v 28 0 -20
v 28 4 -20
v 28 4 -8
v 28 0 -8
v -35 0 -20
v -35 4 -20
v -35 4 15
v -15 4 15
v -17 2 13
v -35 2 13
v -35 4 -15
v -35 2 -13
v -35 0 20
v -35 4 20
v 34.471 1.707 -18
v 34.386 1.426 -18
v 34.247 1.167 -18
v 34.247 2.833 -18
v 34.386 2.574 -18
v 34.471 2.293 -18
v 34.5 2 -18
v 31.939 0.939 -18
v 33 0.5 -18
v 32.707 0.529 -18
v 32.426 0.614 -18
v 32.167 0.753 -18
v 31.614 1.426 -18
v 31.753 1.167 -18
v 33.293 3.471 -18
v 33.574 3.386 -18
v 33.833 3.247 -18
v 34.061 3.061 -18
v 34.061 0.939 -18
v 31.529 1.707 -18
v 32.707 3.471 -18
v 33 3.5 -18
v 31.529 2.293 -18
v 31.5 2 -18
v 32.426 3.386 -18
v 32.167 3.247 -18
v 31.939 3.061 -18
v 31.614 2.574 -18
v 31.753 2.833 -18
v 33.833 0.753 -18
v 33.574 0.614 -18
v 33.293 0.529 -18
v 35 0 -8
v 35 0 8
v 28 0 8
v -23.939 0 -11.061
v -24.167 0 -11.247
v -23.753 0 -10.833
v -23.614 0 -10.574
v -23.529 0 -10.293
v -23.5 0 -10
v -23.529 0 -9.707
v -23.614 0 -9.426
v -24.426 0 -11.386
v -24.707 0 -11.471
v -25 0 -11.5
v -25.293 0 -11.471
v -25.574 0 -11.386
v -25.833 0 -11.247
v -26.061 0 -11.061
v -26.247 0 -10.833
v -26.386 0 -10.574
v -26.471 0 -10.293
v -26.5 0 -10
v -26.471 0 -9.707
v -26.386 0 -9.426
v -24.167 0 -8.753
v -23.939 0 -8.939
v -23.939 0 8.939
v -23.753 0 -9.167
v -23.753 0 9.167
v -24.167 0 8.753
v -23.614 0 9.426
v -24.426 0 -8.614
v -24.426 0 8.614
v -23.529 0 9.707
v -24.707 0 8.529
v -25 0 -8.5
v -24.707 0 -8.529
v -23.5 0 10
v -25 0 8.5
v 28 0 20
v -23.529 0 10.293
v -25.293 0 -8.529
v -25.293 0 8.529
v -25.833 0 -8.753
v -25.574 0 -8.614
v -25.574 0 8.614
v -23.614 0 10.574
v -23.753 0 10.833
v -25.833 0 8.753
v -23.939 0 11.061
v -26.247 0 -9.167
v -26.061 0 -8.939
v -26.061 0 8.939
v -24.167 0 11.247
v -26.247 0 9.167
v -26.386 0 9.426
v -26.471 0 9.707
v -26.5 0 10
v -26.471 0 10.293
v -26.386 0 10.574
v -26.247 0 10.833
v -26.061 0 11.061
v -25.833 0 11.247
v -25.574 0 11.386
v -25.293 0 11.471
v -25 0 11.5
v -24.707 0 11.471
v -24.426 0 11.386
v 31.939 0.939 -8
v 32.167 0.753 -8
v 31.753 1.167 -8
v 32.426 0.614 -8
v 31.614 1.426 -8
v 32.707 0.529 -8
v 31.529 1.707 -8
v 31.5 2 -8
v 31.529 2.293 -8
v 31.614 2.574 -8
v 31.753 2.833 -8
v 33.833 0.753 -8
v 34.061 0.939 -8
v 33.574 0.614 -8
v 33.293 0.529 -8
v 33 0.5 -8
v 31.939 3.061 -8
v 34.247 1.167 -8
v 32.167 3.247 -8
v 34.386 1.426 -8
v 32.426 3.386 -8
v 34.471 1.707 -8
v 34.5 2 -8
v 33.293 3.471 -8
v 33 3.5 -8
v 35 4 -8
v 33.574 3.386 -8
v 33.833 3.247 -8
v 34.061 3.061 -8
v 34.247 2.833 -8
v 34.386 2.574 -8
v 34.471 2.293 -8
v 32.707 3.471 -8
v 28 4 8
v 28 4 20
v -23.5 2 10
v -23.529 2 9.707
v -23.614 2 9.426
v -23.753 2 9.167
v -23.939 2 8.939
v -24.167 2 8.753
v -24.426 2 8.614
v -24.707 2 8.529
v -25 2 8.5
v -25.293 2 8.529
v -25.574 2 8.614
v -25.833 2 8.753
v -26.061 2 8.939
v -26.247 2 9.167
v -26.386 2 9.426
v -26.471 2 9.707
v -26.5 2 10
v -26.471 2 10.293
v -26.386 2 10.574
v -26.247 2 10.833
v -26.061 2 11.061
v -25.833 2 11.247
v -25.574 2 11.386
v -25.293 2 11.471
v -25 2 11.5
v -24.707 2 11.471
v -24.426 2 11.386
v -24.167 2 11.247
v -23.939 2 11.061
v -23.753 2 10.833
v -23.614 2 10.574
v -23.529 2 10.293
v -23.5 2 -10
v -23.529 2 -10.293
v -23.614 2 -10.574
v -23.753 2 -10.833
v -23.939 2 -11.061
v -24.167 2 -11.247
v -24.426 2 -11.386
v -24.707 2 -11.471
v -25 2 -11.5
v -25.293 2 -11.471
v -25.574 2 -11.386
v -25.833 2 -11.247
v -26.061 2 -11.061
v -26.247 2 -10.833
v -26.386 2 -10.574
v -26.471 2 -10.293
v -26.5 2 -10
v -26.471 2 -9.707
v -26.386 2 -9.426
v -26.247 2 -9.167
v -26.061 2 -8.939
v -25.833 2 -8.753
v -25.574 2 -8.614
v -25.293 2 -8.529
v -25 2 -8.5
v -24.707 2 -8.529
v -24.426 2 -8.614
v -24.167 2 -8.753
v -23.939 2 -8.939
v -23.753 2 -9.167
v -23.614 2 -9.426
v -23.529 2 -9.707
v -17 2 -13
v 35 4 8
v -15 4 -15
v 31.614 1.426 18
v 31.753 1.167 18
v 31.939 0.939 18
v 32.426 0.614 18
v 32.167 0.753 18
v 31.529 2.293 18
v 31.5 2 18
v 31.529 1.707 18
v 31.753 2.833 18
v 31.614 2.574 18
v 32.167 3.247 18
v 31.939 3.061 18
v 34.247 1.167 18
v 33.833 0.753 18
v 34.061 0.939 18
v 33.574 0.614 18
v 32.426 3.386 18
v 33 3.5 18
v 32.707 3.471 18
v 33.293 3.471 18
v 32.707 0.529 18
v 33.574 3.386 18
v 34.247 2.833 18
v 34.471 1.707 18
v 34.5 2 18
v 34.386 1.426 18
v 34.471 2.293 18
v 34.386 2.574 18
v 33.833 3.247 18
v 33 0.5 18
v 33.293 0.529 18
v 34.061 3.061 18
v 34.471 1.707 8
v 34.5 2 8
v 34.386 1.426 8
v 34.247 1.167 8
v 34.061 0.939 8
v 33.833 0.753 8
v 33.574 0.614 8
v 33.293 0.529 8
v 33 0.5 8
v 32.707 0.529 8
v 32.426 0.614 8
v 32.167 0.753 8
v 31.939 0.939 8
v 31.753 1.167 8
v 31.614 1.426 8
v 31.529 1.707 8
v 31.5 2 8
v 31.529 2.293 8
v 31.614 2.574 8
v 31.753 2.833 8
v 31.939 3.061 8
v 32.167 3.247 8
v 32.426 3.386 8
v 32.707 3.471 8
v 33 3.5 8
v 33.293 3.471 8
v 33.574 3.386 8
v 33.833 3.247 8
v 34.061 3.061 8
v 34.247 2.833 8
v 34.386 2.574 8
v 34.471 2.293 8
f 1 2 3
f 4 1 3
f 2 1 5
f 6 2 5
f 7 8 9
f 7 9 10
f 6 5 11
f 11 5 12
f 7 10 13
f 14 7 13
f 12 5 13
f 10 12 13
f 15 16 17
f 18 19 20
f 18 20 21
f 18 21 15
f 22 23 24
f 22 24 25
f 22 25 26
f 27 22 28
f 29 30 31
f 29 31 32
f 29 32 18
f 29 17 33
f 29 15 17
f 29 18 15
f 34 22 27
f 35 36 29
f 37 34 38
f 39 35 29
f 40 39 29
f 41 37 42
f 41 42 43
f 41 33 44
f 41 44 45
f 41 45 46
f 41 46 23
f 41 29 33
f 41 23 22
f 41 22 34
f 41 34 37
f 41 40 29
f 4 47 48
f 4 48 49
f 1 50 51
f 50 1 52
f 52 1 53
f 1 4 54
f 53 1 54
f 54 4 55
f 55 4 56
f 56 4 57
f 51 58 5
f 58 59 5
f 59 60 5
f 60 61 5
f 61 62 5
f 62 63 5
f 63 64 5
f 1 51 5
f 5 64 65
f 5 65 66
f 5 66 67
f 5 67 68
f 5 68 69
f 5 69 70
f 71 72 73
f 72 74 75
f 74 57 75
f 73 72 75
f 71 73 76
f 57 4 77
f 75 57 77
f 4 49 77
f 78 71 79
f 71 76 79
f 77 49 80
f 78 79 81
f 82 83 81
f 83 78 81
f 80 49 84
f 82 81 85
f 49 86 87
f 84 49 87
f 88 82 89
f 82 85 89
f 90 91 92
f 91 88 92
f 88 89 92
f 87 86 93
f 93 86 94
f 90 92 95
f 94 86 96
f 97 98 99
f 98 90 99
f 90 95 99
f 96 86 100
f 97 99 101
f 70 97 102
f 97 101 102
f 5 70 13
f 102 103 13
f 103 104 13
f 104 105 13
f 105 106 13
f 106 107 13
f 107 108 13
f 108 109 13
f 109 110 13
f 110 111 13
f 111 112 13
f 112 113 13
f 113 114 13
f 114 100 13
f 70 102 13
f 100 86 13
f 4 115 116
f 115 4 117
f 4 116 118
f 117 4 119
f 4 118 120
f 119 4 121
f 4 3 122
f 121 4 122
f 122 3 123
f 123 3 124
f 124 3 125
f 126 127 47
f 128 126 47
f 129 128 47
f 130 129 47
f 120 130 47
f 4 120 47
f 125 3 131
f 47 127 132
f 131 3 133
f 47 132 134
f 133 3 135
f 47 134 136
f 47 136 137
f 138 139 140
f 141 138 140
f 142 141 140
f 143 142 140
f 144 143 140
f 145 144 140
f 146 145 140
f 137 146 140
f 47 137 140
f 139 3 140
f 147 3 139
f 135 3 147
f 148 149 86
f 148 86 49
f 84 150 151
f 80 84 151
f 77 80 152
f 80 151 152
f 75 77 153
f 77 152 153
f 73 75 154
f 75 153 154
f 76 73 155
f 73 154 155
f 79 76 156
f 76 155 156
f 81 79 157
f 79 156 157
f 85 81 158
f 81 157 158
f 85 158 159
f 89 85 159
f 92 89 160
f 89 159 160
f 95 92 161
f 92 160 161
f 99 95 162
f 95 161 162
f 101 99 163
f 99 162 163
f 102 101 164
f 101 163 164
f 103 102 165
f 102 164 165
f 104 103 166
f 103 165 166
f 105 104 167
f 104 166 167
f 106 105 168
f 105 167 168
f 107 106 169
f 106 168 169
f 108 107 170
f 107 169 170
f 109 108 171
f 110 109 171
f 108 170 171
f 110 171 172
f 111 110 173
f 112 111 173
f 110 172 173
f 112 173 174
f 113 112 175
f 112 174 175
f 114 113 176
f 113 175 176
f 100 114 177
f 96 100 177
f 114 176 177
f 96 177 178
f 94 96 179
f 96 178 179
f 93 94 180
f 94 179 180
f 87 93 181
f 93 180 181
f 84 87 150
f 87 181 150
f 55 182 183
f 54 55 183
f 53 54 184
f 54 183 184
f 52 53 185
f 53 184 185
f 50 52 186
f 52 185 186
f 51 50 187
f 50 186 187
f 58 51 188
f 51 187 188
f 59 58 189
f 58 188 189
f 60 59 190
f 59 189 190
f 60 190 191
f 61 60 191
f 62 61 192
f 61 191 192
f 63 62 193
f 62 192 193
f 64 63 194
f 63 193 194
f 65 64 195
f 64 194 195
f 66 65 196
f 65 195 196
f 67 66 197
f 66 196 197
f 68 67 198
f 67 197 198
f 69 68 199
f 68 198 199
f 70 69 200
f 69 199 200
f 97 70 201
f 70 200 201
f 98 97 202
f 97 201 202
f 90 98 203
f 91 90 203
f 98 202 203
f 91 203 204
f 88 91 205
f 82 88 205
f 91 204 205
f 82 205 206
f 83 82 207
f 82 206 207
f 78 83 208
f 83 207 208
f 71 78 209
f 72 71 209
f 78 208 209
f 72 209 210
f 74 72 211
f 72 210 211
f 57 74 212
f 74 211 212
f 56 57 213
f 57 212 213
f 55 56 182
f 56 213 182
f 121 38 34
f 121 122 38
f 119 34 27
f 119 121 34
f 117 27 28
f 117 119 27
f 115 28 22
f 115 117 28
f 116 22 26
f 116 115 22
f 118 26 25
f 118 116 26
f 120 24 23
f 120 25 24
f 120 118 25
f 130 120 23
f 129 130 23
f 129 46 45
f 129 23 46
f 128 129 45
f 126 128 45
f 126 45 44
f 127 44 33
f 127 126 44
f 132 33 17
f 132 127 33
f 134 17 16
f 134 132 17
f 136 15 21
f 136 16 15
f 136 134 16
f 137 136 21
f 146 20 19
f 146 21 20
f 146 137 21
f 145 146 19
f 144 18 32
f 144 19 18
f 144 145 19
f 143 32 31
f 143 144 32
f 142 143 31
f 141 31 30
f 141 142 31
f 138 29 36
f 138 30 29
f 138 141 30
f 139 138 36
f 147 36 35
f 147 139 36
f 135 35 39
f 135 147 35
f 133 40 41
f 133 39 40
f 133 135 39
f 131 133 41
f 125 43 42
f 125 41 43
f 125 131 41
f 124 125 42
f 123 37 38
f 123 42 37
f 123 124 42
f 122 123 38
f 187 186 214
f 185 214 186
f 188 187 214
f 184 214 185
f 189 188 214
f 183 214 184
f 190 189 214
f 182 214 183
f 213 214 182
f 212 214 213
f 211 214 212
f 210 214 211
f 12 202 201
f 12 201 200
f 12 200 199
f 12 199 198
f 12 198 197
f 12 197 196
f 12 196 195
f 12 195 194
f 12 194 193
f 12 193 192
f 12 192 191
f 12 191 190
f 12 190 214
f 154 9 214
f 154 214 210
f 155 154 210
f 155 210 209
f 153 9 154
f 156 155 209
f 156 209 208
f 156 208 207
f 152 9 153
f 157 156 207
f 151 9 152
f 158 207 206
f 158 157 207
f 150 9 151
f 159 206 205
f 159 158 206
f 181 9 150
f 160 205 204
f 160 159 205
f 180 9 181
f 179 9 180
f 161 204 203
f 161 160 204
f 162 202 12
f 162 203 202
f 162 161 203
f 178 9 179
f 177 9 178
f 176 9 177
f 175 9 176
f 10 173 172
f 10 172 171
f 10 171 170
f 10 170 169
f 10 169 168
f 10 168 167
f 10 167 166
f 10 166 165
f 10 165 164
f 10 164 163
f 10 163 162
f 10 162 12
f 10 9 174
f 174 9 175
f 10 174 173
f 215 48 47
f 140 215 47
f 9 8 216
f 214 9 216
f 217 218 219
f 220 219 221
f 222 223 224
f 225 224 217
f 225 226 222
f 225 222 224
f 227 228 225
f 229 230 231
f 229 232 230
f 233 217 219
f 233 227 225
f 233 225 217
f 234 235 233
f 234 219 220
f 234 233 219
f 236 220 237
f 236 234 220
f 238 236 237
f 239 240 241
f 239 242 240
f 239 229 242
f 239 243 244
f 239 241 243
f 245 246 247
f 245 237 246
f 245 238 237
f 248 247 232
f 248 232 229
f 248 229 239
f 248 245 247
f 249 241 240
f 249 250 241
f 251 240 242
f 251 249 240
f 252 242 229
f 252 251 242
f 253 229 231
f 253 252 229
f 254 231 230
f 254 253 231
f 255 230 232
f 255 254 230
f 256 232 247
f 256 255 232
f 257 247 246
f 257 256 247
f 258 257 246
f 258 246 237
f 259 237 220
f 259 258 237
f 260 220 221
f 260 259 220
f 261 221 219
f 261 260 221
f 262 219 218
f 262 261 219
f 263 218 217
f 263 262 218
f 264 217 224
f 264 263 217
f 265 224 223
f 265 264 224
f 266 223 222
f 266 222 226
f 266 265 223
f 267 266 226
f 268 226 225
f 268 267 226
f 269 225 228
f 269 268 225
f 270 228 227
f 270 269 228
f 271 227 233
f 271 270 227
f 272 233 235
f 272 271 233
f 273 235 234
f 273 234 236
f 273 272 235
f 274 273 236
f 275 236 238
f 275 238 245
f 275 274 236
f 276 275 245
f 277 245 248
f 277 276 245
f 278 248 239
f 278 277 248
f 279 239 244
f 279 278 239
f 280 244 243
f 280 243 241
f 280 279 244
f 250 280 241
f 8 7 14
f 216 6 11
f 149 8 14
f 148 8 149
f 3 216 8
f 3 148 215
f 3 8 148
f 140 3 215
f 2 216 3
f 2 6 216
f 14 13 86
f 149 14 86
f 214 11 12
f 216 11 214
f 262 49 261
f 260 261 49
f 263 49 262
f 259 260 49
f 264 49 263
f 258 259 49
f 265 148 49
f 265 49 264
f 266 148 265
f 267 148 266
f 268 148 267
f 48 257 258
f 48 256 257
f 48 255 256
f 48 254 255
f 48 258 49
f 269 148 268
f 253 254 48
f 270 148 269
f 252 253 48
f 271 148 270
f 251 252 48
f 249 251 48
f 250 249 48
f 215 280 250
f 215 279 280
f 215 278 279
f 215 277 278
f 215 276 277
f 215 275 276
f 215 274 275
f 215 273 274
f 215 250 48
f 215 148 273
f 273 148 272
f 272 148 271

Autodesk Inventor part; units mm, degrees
ref_plane "YZ Plane" through (0, 0, 0) normal (1, 0, 0) x (0, 1, 0)
ref_plane "XZ Plane" through (0, 0, 0) normal (0, 1, 0) x (-1, 0, 0)
ref_plane "XY Plane" through (0, 0, 0) normal (0, 0, 1) x (1, 0, 0)
sketch "Sketch1" plane through (0, 0, 0) normal (0, 1, 0) x (-1, 0, 0)
  point P0 (0, 0)
sketch "Sketch2" plane through (0, 0, 0) normal (0, 1, 0) x (-1, 0, 0)
  point P0 (0, 0)
sketch "Sketch3" plane through (0, 0, 0) normal (0, 1, 0) x (-1, 0, 0)
  point P0 (0, 0)
sketch "Sketch4" plane through (0, 0, 0) normal (0, 1, 0) x (-1, 0, 0)
  line L0 (35, 20) -> (-35, 20)
  line L1 (-35, 20) -> (-35, -20)
  line L2 (-35, -20) -> (35, -20)
  line L3 (35, -20) -> (35, 20)
  line L4 (35, 20) -> (-35, -20) construction
  line L5 (-35, 20) -> (35, -20) construction
  point P0 (0, 0)
  dimension "d0" = 70
  dimension "d1" = 40
extrude "Extrusion1" add sketch "Sketch4" along normal blind 2
sketch "Sketch5" plane through (0, 2, 0) normal (0, 1, 0) x (1, 0, 0)
  line L0 (-35, 20) -> (-35, -20) projected
  line L1 (-35, 0) -> (-25, 0)
  line L2 (-25, 0) -> (-25, 10)
  line L3 (-25, 10) -> (-25, -10)
  circle A0 centre (-25, -10) radius 1.5
  circle A1 centre (-25, 10) radius 1.5
  point P0 (0, 0)
  dimension "d4" = 10
  dimension "d5" = 10
  dimension "d6" = 20
  dimension "d7" = 3
  dimension "d8" = 3
extrude "Extrusion2" cut sketch "Sketch5" against normal blind 3
sketch "Sketch6" plane through (0, 2, 0) normal (0, 1, 0) x (1, 0, 0)
  line L0 (-35, -20) -> (35, -20) projected
  line L1 (35, 20) -> (-35, 20) projected
  line L2 (35, -20) -> (-15, -20)
  line L3 (-15, -20) -> (-15, 20)
  line L4 (-15, 20) -> (35, 20)
  line L5 (35, 20) -> (35, -20)
  line L6 (-35, 20) -> (-35, -20) projected
  line L7 (-15, 20) -> (-35, 20)
  line L8 (-35, 20) -> (-35, 15)
  line L9 (-35, 15) -> (-15, 15)
  line L10 (-15, 15) -> (-15, 20)
  line L11 (-35, -20) -> (-15, -20)
  line L12 (-15, -20) -> (-15, -15)
  line L13 (-15, -15) -> (-35, -15)
  line L14 (-35, -15) -> (-35, -20)
  point P0 (0, 0)
  dimension "d11" = 50
  dimension "d12" = 5
  dimension "d13" = 5
extrude "Extrusion3" add sketch "Sketch6" along normal blind 2 contours L6 L13 L3 L0 | L3 L1 L5 L0 | L6 L1 L3 L9
chamfer "Chamfer1" distance 2 angle 45 3 edges at (-25, 2, 15) (-15, 2, 0) (-25, 2, -15)
sketch "Sketch7" plane through (0, 4, 0) normal (0, 1, 0) x (1, 0, 0)
  line L0 (35, -20) -> (35, 20) projected
  line L1 (35, -20) -> (28, -20)
  line L2 (28, -20) -> (28, -8)
  line L3 (28, -8) -> (35, -8)
  line L4 (35, -8) -> (35, -20)
  line L5 (35, 20) -> (28, 20)
  line L6 (28, 20) -> (28, 8)
  line L7 (28, 8) -> (35, 8)
  line L8 (35, 8) -> (35, 20)
  point P0 (0, 0)
  dimension "d19" = 7
  dimension "d20" = 12
  dimension "d21" = 12
extrude "Extrusion4" cut sketch "Sketch7" against normal blind 4
sketch "Sketch8" plane through (28, 4, 8) normal (0, 0, 1) x (1, 0, 0)
  line L0 (7, -4) -> (7, 0) projected
  line L1 (7, 0) -> (3, -4)
  line L2 (0, -4) -> (7, -4) projected
  line L3 (7, 0) -> (12.6569, 0) construction
  circle A0 centre (5, -2) radius 1.5
  point P0 (-28, -4)
  dimension "d24" = 135
  dimension "d25" = 3
extrude "Extrusion5" add sketch "Sketch8" along normal blind 10 contours A0 L1 | L1 A0
sketch "Sketch9" plane through (35, 4, -8) normal (0, 0, -1) x (-1, 0, 0)
  circle A0 centre (2, -2) radius 1.5 projected
  circle A1 centre (2, -2) radius 1.5
  point P0 (35, -4)
extrude "Extrusion6" add sketch "Sketch9" along normal blind 10
equation "\"d9\" = d7"
properties part number "upper"
